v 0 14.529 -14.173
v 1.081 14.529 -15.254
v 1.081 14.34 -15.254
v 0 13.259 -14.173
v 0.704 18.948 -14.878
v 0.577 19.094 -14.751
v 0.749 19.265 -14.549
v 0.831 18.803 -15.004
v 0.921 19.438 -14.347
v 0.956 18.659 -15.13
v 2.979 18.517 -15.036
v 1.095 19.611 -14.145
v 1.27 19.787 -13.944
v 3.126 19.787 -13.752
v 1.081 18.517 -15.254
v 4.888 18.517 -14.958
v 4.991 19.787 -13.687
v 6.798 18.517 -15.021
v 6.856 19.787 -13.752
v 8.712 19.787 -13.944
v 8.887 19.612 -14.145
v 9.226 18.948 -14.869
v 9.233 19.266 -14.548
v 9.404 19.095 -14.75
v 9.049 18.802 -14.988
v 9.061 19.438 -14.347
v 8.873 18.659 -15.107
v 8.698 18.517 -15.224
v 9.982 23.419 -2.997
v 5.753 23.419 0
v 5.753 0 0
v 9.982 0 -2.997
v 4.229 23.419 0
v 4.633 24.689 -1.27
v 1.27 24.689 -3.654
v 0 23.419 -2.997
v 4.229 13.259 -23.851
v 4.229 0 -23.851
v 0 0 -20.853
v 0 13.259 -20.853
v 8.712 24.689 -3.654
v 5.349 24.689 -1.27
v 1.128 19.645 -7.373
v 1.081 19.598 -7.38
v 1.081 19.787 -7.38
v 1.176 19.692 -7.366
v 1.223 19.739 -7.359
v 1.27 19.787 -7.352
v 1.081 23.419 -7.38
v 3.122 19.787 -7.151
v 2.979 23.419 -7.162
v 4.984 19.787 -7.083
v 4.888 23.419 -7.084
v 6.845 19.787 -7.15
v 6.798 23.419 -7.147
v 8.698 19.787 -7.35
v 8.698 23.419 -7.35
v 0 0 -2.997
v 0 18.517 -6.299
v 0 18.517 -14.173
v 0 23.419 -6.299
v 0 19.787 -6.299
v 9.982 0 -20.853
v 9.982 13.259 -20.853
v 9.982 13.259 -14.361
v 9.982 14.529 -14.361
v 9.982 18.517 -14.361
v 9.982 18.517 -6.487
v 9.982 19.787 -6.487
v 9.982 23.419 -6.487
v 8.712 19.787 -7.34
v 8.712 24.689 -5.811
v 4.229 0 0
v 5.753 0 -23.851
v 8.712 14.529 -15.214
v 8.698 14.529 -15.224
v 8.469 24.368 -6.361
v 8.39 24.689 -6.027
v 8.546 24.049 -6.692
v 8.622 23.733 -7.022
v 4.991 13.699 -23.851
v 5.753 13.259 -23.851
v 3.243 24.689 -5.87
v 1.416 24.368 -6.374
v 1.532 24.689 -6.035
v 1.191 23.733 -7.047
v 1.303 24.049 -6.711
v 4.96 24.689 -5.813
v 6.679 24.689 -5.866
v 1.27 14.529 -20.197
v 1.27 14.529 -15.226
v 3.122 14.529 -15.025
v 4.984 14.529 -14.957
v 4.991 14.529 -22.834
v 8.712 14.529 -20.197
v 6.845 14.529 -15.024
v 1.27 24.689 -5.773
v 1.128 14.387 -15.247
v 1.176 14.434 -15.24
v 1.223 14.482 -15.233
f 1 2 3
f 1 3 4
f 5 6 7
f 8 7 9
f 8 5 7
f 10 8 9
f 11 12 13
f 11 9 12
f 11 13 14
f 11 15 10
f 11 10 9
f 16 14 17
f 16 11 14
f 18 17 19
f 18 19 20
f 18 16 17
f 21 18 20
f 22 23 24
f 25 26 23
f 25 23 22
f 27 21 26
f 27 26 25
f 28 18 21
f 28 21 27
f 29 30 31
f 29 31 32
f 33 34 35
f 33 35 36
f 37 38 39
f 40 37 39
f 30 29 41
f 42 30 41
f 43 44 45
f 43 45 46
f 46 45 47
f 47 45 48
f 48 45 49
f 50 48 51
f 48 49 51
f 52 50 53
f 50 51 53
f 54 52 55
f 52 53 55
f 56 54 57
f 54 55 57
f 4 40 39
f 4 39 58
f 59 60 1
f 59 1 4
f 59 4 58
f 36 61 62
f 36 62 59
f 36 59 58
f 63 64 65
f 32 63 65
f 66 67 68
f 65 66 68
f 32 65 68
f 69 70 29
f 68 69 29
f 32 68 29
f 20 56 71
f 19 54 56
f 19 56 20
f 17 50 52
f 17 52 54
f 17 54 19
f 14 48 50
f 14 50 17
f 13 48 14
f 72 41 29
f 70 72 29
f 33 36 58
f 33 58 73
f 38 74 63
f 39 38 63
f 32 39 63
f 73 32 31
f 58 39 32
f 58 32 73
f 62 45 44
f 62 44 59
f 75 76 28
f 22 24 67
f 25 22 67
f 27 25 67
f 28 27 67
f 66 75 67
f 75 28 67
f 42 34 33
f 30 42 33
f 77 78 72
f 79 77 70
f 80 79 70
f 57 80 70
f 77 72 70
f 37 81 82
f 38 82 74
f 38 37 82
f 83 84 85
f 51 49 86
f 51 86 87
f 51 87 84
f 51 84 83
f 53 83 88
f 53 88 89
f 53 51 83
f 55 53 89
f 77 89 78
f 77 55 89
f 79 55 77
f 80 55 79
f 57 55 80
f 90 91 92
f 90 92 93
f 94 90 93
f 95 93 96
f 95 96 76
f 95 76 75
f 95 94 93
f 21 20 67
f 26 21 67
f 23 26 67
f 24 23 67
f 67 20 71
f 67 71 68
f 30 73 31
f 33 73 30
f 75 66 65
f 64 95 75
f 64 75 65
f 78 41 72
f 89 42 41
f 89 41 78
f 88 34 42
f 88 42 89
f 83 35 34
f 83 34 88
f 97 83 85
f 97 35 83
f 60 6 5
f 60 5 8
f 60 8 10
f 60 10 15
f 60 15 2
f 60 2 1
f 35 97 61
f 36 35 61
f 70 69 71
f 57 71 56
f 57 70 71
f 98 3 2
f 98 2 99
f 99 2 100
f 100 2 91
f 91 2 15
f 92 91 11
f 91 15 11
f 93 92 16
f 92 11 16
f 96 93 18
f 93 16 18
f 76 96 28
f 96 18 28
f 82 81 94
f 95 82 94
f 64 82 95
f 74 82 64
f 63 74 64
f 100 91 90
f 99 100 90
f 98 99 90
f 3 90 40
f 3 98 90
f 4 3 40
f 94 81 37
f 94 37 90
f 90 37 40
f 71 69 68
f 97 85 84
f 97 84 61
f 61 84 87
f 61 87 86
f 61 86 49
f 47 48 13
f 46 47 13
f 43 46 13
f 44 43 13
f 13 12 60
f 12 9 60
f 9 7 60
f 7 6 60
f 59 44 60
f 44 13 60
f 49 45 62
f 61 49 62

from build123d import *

# Parameters (mm, degrees)
EXTRUDE1_DEPTH     = 9.9822
CUT_EXTRUDE1_DEPTH = 36.749577377
SKETCH3_R          = 25.885731189
CUT_EXTRUDE2_DEPTH = 4.9022
SKETCH4_R          = 25.885731189
CUT_EXTRUDE3_DEPTH = 5.2578
CHAMFER1_SIZE      = 1.08172717
CHAMFER1_SIZE_2    = 1.27
CHAMFER2_SIZE      = 1.27
CHAMFER3_SIZE      = 1.27
CHAMFER4_SIZE      = 1.27


with BuildPart() as part:
    # Sketch1 → Extrude1 (new body)
    with BuildSketch(Plane(origin=(0, 0, 0), x_dir=(0, 0, -1), z_dir=(1, 0, 0))):
        Polygon((7.5692, 24.6888), (7.5692, 19.7866), (15.4432, 19.7866), (15.4432, 14.5288), (23.8506, 14.5288), (23.8506, 0), (0, 0), (0, 24.6888), align=None)
    extrude(amount=EXTRUDE1_DEPTH)

    # Sketch2 → Cut-Extrude1 (cut, through all)
    with BuildSketch(Plane(origin=(0, 24.6888, 0), x_dir=(1, 0, 0), z_dir=(0, 1, 0))):
        Polygon((0, 2.9972), (4.2291, 0), (0, 0), align=None)
        Polygon((9.9822, 2.9972), (9.9822, 0), (5.7531, 0), align=None)
        Polygon((0, 23.8506), (4.2291, 23.8506), (0, 20.8534), align=None)
        Polygon((9.9822, 20.8534), (9.9822, 23.8506), (5.7531, 23.8506), align=None)
    extrude(amount=-CUT_EXTRUDE1_DEPTH, mode=Mode.SUBTRACT)

    # Sketch3 → Cut-Extrude2 (cut)
    with BuildSketch(Plane(origin=(0, 24.6888, 0), x_dir=(1, 0, 0), z_dir=(0, 1, 0))):
        with Locations((4.9911, 32.9692)):
            Circle(SKETCH3_R)
    extrude(amount=-CUT_EXTRUDE2_DEPTH, mode=Mode.SUBTRACT)

    # Sketch4 → Cut-Extrude3 (cut)
    with BuildSketch(Plane(origin=(0, 19.7866, 0), x_dir=(1, 0, 0), z_dir=(0, 1, 0))):
        with Locations((4.9911, 40.8432)):
            Circle(SKETCH4_R)
    extrude(amount=-CUT_EXTRUDE3_DEPTH, mode=Mode.SUBTRACT)

    # Chamfer1
    # the kernel refuses this chamfer: 1.27, 1.08172717 mm, written as the material it takes off along each edge
    with BuildSketch(Plane(origin=(9.9822, 23.137823144, -15.4432), x_dir=(-0.9857782143008734, 0, 0.168051516535202), z_dir=(0, -1, 0))) as chamfer1_piece_1:
        with BuildLine():
            Line((1.303218251, 0), (CHAMFER1_SIZE * 0.168051516609, -CHAMFER1_SIZE * 0.985778214731))
            Line((CHAMFER1_SIZE * 0.168051516609, -CHAMFER1_SIZE * 0.985778214731), (0, 0))
            ThreePointArc((0, 0), (0.67003435, -0.008196065), (1.303218251, 0))
        make_face()
    extrude(amount=8.609023144, mode=Mode.SUBTRACT)
    with BuildSketch(Plane(origin=(9.9822, 28.040023144, -7.5692), x_dir=(0, 0, 1), z_dir=(0, -1, 0))) as chamfer1_piece_2:
        with BuildLine():
            Line((CHAMFER1_SIZE, 0), (0.219007803, 1.28468416))
            ThreePointArc((0.219007803, 1.28468416), (0.12067979, 0.659127904), (0, 0))
            Line((0, 0), (CHAMFER1_SIZE, 0))
        make_face()
    extrude(amount=8.253423144, mode=Mode.SUBTRACT)
    with BuildSketch(Plane(origin=(0, 27.954837395, -7.5692), x_dir=(0.9851028173062452, 0, 0.1719663901327771), z_dir=(0, -1, 0))) as chamfer1_piece_3:
        with BuildLine():
            Line((1.097600724, 0), (CHAMFER1_SIZE_2 * 0.171966390133, CHAMFER1_SIZE_2 * 0.985102817306))
            Line((CHAMFER1_SIZE_2 * 0.171966390133, CHAMFER1_SIZE_2 * 0.985102817306), (0, 0))
            ThreePointArc((0, 0), (0.563419729, 0.005814052), (1.097600724, 0))
        make_face()
    extrude(amount=8.168237395, mode=Mode.SUBTRACT)
    with BuildSketch(Plane(origin=(0, 23.052637395, -15.4432), x_dir=(0.985102817306246, 0, 0.17196639013277196), z_dir=(0, -1, 0))) as chamfer1_piece_4:
        with BuildLine():
            Line((1.097600724, 0), (CHAMFER1_SIZE_2 * 0.171966390133, CHAMFER1_SIZE_2 * 0.985102817306))
            Line((CHAMFER1_SIZE_2 * 0.171966390133, CHAMFER1_SIZE_2 * 0.985102817306), (0, 0))
            ThreePointArc((0, 0), (0.563419729, 0.005814052), (1.097600724, 0))
        make_face()
    extrude(amount=8.523837395, mode=Mode.SUBTRACT)

    # Chamfer2
    # the kernel refuses this chamfer: 1.27 mm, written as the material it takes off along each edge
    with BuildSketch(Plane(origin=(3.088405412, 24.6888, 1.88849226), x_dir=(0, -1, 0), z_dir=(0.8158799994392605, 0, -0.5782212608638604))) as chamfer2_piece_1:
        Polygon((CHAMFER2_SIZE, 0), (0, CHAMFER2_SIZE), (0, 0), align=None)
    extrude(amount=11.715557658, mode=Mode.SUBTRACT)
    with BuildSketch(Plane(origin=(0.963062605, 24.6888, 0), x_dir=(0, 0, -1), z_dir=(1, 0, 0))) as chamfer2_piece_2:
        Polygon((CHAMFER2_SIZE, 0), (0, -CHAMFER2_SIZE), (0, 0), align=None)
    extrude(amount=8.056074789, mode=Mode.SUBTRACT)
    with BuildSketch(Plane(origin=(-2.664694588, 24.6888, -4.88569226), x_dir=(0.5782212608638604, 0, -0.8158799994392603), z_dir=(0.8158799994392604, 0, 0.5782212608638605))) as chamfer2_piece_3:
        Polygon((CHAMFER2_SIZE, 0), (0, -CHAMFER2_SIZE), (0, 0), align=None)
    extrude(amount=11.715557658, mode=Mode.SUBTRACT)
    with BuildSketch(Plane(origin=(0, 24.6888, 0.268837395), x_dir=(1, 0, 0), z_dir=(0, 0, -1))) as chamfer2_piece_4:
        Polygon((CHAMFER2_SIZE, 0), (0, CHAMFER2_SIZE), (0, 0), align=None)
    extrude(amount=9.834074789, mode=Mode.SUBTRACT)
    with BuildSketch(Plane(origin=(3.390686755, 24.6888, -9.689886755), x_dir=(0.7071067811864264, 0, 0.7071067811866687), z_dir=(-0.7071067811866687, 0, 0.7071067811864264))) as chamfer2_piece_5:
        Polygon((CHAMFER2_SIZE, 0), (0, -CHAMFER2_SIZE), (0, 0), align=None)
    extrude(amount=8.061192589, mode=Mode.SUBTRACT)
    with BuildSketch(Plane(origin=(4.9911, 24.6888, -32.9692), x_dir=(-0.27423691753181434, 0, 0.9616621616049208), z_dir=(-0.9616621616049208, 0, -0.27423691753181434))) as chamfer2_piece_6:
        Polygon((25.885731189 + CHAMFER2_SIZE, 0), (25.885731189, -CHAMFER2_SIZE), (25.885731189, 0), align=None)
    revolve(axis=Axis((4.9911, 24.6888, -32.9692), (0, 1, 0)), revolution_arc=31.377850279, mode=Mode.SUBTRACT)
    with BuildSketch(Plane(origin=(12.693590923, 24.6888, -4.666659955), x_dir=(-0.5574990899678705, 0, 0.8301775500969635), z_dir=(-0.8301775500969636, 0, -0.5574990899678705))) as chamfer2_piece_7:
        Polygon((CHAMFER2_SIZE, 0), (0, -CHAMFER2_SIZE), (0, 0), align=None)
    extrude(amount=8.079556, mode=Mode.SUBTRACT)
    with BuildSketch(Plane(origin=(9.9822, 24.6888, 0.268837395), x_dir=(-1, 0, 0), z_dir=(0, 0, -1))) as chamfer2_piece_8:
        Polygon((CHAMFER2_SIZE, 0), (0, -CHAMFER2_SIZE), (0, 0), align=None)
    extrude(amount=10.022347619, mode=Mode.SUBTRACT)
    with BuildSketch(Plane(origin=(9.9822, 14.5288, -24.119437395), x_dir=(-1, 0, 0), z_dir=(0, 0, 1))) as chamfer2_piece_9_section:
        Polygon((CHAMFER2_SIZE, 0), (0, CHAMFER2_SIZE), (0, 0), align=None)
    chamfer2_piece_9 = extrude(amount=13.02400196, mode=Mode.PRIVATE)
    chamfer2_piece_9 = split(chamfer2_piece_9, bisect_by=Plane(origin=(5.465987334, 14.5288, -17.394299305), z_dir=(0.5574990901783627, 0, -0.8301775499556092)), keep=Keep.TOP, mode=Mode.PRIVATE)
    add(chamfer2_piece_9, mode=Mode.SUBTRACT)
    with BuildSketch(Plane(origin=(0, 14.5288, -10.907162605), x_dir=(1, 0, 0), z_dir=(0, 0, -1))) as chamfer2_piece_10_section:
        Polygon((CHAMFER2_SIZE, 0), (0, CHAMFER2_SIZE), (0, 0), align=None)
    chamfer2_piece_10 = extrude(amount=13.212274789, mode=Mode.PRIVATE)
    chamfer2_piece_10 = split(chamfer2_piece_10, bisect_by=Plane(origin=(-1.633018697, 14.5288, -12.540181303), z_dir=(-0.7071067811864264, 0, -0.7071067811866687)), keep=Keep.TOP, mode=Mode.PRIVATE)
    chamfer2_piece_10 = chamfer2_piece_10 - Plane(origin=(4.9911, 14.5288, -40.8432), x_dir=(1, 0, 0), z_dir=(0, 1, 0)) * Cylinder(25.885731189, 32, mode=Mode.PRIVATE)
    add(chamfer2_piece_10, mode=Mode.SUBTRACT)
    with BuildSketch(Plane(origin=(0, 14.5288, -10.907162605), x_dir=(1, 0, 0), z_dir=(0, 0, -1))) as chamfer2_piece_11_section:
        Polygon((CHAMFER2_SIZE, 0), (0, CHAMFER2_SIZE), (0, 0), align=None)
    chamfer2_piece_11 = extrude(amount=13.212274789, mode=Mode.PRIVATE)
    chamfer2_piece_11 = split(chamfer2_piece_11, bisect_by=Plane(origin=(-1.633018697, 14.5288, -12.540181303), z_dir=(0.7071067811864264, 0, 0.7071067811866687)), keep=Keep.TOP, mode=Mode.PRIVATE)
    chamfer2_piece_11 = chamfer2_piece_11 & Plane(origin=(4.9911, 14.5288, -40.8432), x_dir=(1, 0, 0), z_dir=(0, 1, 0)) * Cylinder(25.885731189, 32, mode=Mode.PRIVATE)
    add(chamfer2_piece_11, mode=Mode.SUBTRACT)
    with BuildSketch(Plane(origin=(0, 14.5288, -10.907162605), x_dir=(1, 0, 0), z_dir=(0, 0, -1))) as chamfer2_piece_12_section:
        Polygon((CHAMFER2_SIZE, 0), (0, CHAMFER2_SIZE), (0, 0), align=None)
    chamfer2_piece_12 = extrude(amount=13.212274789, mode=Mode.PRIVATE)
    chamfer2_piece_12 = split(chamfer2_piece_12, bisect_by=Plane(origin=(-1.633018697, 14.5288, -12.540181303), z_dir=(-0.7071067811864264, 0, -0.7071067811866687)), keep=Keep.TOP, mode=Mode.PRIVATE)
    chamfer2_piece_12 = chamfer2_piece_12 & Plane(origin=(4.9911, 14.5288, -40.8432), x_dir=(1, 0, 0), z_dir=(0, 1, 0)) * Cylinder(25.885731189, 32, mode=Mode.PRIVATE)
    add(chamfer2_piece_12, mode=Mode.SUBTRACT)
    with BuildSketch(Plane(origin=(0, 19.7866, -17.439237395), x_dir=(1, 0, 0), z_dir=(0, 0, 1))) as chamfer2_piece_13_section:
        Polygon((CHAMFER2_SIZE, 0), (0, -CHAMFER2_SIZE), (0, 0), align=None)
    chamfer2_piece_13 = extrude(amount=14.406074789, mode=Mode.PRIVATE)
    chamfer2_piece_13 = chamfer2_piece_13 & Plane(origin=(4.9911, 19.7866, -32.9692), x_dir=(1, 0, 0), z_dir=(0, 1, 0)) * Cylinder(25.885731189, 34, mode=Mode.PRIVATE)
    chamfer2_piece_13 = split(chamfer2_piece_13, bisect_by=Plane(origin=(5.570018697, 19.7866, -11.869218697), z_dir=(-0.7071067811864264, 0, -0.7071067811866687)), keep=Keep.TOP, mode=Mode.PRIVATE)
    add(chamfer2_piece_13, mode=Mode.SUBTRACT)
    with BuildSketch(Plane(origin=(0, 19.7866, -17.439237395), x_dir=(1, 0, 0), z_dir=(0, 0, 1))) as chamfer2_piece_14_section:
        Polygon((CHAMFER2_SIZE, 0), (0, -CHAMFER2_SIZE), (0, 0), align=None)
    chamfer2_piece_14 = extrude(amount=14.406074789, mode=Mode.PRIVATE)
    chamfer2_piece_14 = chamfer2_piece_14 - Plane(origin=(4.9911, 19.7866, -32.9692), x_dir=(1, 0, 0), z_dir=(0, 1, 0)) * Cylinder(25.885731189, 34, mode=Mode.PRIVATE)
    chamfer2_piece_14 = split(chamfer2_piece_14, bisect_by=Plane(origin=(5.570018697, 19.7866, -11.869218697), z_dir=(-0.7071067811864264, 0, -0.7071067811866687)), keep=Keep.TOP, mode=Mode.PRIVATE)
    add(chamfer2_piece_14, mode=Mode.SUBTRACT)
    with BuildSketch(Plane(origin=(0, 19.7866, -17.439237395), x_dir=(1, 0, 0), z_dir=(0, 0, 1))) as chamfer2_piece_15_section:
        Polygon((CHAMFER2_SIZE, 0), (0, -CHAMFER2_SIZE), (0, 0), align=None)
    chamfer2_piece_15 = extrude(amount=14.406074789, mode=Mode.PRIVATE)
    chamfer2_piece_15 = chamfer2_piece_15 & Plane(origin=(4.9911, 19.7866, -32.9692), x_dir=(1, 0, 0), z_dir=(0, 1, 0)) * Cylinder(25.885731189, 34, mode=Mode.PRIVATE)
    chamfer2_piece_15 = split(chamfer2_piece_15, bisect_by=Plane(origin=(5.570018697, 19.7866, -11.869218697), z_dir=(0.7071067811864264, 0, 0.7071067811866687)), keep=Keep.TOP, mode=Mode.PRIVATE)
    add(chamfer2_piece_15, mode=Mode.SUBTRACT)
    with BuildSketch(Plane(origin=(9.9822, 19.7866, -3.221435435), x_dir=(-1, 0, 0), z_dir=(0, 0, -1))) as chamfer2_piece_16_section:
        Polygon((CHAMFER2_SIZE, 0), (0, -CHAMFER2_SIZE), (0, 0), align=None)
    chamfer2_piece_16 = extrude(amount=14.406074789, mode=Mode.PRIVATE)
    chamfer2_piece_16 = split(chamfer2_piece_16, bisect_by=Plane(origin=(11.493797972, 19.7866, -5.472371309), z_dir=(0.5574990899678705, 0, -0.8301775500969636)), keep=Keep.TOP, mode=Mode.PRIVATE)
    add(chamfer2_piece_16, mode=Mode.SUBTRACT)

    # Chamfer3
    chamfer3_edges = [part.edges().sort_by_distance(p)[0] for p in [
        (7.23265, 14.5288, -22.80203003),
        (4.983681173, 19.7866, -14.957469874),
    ]]
    chamfer(chamfer3_edges, length=CHAMFER3_SIZE)

    # Chamfer4
    chamfer4_edges = [part.edges().sort_by_distance(p)[0] for p in [
        (2.581452238, 14.5288, -22.682897683),
    ]]
    chamfer(chamfer4_edges, length=CHAMFER4_SIZE)


solid = part.part
